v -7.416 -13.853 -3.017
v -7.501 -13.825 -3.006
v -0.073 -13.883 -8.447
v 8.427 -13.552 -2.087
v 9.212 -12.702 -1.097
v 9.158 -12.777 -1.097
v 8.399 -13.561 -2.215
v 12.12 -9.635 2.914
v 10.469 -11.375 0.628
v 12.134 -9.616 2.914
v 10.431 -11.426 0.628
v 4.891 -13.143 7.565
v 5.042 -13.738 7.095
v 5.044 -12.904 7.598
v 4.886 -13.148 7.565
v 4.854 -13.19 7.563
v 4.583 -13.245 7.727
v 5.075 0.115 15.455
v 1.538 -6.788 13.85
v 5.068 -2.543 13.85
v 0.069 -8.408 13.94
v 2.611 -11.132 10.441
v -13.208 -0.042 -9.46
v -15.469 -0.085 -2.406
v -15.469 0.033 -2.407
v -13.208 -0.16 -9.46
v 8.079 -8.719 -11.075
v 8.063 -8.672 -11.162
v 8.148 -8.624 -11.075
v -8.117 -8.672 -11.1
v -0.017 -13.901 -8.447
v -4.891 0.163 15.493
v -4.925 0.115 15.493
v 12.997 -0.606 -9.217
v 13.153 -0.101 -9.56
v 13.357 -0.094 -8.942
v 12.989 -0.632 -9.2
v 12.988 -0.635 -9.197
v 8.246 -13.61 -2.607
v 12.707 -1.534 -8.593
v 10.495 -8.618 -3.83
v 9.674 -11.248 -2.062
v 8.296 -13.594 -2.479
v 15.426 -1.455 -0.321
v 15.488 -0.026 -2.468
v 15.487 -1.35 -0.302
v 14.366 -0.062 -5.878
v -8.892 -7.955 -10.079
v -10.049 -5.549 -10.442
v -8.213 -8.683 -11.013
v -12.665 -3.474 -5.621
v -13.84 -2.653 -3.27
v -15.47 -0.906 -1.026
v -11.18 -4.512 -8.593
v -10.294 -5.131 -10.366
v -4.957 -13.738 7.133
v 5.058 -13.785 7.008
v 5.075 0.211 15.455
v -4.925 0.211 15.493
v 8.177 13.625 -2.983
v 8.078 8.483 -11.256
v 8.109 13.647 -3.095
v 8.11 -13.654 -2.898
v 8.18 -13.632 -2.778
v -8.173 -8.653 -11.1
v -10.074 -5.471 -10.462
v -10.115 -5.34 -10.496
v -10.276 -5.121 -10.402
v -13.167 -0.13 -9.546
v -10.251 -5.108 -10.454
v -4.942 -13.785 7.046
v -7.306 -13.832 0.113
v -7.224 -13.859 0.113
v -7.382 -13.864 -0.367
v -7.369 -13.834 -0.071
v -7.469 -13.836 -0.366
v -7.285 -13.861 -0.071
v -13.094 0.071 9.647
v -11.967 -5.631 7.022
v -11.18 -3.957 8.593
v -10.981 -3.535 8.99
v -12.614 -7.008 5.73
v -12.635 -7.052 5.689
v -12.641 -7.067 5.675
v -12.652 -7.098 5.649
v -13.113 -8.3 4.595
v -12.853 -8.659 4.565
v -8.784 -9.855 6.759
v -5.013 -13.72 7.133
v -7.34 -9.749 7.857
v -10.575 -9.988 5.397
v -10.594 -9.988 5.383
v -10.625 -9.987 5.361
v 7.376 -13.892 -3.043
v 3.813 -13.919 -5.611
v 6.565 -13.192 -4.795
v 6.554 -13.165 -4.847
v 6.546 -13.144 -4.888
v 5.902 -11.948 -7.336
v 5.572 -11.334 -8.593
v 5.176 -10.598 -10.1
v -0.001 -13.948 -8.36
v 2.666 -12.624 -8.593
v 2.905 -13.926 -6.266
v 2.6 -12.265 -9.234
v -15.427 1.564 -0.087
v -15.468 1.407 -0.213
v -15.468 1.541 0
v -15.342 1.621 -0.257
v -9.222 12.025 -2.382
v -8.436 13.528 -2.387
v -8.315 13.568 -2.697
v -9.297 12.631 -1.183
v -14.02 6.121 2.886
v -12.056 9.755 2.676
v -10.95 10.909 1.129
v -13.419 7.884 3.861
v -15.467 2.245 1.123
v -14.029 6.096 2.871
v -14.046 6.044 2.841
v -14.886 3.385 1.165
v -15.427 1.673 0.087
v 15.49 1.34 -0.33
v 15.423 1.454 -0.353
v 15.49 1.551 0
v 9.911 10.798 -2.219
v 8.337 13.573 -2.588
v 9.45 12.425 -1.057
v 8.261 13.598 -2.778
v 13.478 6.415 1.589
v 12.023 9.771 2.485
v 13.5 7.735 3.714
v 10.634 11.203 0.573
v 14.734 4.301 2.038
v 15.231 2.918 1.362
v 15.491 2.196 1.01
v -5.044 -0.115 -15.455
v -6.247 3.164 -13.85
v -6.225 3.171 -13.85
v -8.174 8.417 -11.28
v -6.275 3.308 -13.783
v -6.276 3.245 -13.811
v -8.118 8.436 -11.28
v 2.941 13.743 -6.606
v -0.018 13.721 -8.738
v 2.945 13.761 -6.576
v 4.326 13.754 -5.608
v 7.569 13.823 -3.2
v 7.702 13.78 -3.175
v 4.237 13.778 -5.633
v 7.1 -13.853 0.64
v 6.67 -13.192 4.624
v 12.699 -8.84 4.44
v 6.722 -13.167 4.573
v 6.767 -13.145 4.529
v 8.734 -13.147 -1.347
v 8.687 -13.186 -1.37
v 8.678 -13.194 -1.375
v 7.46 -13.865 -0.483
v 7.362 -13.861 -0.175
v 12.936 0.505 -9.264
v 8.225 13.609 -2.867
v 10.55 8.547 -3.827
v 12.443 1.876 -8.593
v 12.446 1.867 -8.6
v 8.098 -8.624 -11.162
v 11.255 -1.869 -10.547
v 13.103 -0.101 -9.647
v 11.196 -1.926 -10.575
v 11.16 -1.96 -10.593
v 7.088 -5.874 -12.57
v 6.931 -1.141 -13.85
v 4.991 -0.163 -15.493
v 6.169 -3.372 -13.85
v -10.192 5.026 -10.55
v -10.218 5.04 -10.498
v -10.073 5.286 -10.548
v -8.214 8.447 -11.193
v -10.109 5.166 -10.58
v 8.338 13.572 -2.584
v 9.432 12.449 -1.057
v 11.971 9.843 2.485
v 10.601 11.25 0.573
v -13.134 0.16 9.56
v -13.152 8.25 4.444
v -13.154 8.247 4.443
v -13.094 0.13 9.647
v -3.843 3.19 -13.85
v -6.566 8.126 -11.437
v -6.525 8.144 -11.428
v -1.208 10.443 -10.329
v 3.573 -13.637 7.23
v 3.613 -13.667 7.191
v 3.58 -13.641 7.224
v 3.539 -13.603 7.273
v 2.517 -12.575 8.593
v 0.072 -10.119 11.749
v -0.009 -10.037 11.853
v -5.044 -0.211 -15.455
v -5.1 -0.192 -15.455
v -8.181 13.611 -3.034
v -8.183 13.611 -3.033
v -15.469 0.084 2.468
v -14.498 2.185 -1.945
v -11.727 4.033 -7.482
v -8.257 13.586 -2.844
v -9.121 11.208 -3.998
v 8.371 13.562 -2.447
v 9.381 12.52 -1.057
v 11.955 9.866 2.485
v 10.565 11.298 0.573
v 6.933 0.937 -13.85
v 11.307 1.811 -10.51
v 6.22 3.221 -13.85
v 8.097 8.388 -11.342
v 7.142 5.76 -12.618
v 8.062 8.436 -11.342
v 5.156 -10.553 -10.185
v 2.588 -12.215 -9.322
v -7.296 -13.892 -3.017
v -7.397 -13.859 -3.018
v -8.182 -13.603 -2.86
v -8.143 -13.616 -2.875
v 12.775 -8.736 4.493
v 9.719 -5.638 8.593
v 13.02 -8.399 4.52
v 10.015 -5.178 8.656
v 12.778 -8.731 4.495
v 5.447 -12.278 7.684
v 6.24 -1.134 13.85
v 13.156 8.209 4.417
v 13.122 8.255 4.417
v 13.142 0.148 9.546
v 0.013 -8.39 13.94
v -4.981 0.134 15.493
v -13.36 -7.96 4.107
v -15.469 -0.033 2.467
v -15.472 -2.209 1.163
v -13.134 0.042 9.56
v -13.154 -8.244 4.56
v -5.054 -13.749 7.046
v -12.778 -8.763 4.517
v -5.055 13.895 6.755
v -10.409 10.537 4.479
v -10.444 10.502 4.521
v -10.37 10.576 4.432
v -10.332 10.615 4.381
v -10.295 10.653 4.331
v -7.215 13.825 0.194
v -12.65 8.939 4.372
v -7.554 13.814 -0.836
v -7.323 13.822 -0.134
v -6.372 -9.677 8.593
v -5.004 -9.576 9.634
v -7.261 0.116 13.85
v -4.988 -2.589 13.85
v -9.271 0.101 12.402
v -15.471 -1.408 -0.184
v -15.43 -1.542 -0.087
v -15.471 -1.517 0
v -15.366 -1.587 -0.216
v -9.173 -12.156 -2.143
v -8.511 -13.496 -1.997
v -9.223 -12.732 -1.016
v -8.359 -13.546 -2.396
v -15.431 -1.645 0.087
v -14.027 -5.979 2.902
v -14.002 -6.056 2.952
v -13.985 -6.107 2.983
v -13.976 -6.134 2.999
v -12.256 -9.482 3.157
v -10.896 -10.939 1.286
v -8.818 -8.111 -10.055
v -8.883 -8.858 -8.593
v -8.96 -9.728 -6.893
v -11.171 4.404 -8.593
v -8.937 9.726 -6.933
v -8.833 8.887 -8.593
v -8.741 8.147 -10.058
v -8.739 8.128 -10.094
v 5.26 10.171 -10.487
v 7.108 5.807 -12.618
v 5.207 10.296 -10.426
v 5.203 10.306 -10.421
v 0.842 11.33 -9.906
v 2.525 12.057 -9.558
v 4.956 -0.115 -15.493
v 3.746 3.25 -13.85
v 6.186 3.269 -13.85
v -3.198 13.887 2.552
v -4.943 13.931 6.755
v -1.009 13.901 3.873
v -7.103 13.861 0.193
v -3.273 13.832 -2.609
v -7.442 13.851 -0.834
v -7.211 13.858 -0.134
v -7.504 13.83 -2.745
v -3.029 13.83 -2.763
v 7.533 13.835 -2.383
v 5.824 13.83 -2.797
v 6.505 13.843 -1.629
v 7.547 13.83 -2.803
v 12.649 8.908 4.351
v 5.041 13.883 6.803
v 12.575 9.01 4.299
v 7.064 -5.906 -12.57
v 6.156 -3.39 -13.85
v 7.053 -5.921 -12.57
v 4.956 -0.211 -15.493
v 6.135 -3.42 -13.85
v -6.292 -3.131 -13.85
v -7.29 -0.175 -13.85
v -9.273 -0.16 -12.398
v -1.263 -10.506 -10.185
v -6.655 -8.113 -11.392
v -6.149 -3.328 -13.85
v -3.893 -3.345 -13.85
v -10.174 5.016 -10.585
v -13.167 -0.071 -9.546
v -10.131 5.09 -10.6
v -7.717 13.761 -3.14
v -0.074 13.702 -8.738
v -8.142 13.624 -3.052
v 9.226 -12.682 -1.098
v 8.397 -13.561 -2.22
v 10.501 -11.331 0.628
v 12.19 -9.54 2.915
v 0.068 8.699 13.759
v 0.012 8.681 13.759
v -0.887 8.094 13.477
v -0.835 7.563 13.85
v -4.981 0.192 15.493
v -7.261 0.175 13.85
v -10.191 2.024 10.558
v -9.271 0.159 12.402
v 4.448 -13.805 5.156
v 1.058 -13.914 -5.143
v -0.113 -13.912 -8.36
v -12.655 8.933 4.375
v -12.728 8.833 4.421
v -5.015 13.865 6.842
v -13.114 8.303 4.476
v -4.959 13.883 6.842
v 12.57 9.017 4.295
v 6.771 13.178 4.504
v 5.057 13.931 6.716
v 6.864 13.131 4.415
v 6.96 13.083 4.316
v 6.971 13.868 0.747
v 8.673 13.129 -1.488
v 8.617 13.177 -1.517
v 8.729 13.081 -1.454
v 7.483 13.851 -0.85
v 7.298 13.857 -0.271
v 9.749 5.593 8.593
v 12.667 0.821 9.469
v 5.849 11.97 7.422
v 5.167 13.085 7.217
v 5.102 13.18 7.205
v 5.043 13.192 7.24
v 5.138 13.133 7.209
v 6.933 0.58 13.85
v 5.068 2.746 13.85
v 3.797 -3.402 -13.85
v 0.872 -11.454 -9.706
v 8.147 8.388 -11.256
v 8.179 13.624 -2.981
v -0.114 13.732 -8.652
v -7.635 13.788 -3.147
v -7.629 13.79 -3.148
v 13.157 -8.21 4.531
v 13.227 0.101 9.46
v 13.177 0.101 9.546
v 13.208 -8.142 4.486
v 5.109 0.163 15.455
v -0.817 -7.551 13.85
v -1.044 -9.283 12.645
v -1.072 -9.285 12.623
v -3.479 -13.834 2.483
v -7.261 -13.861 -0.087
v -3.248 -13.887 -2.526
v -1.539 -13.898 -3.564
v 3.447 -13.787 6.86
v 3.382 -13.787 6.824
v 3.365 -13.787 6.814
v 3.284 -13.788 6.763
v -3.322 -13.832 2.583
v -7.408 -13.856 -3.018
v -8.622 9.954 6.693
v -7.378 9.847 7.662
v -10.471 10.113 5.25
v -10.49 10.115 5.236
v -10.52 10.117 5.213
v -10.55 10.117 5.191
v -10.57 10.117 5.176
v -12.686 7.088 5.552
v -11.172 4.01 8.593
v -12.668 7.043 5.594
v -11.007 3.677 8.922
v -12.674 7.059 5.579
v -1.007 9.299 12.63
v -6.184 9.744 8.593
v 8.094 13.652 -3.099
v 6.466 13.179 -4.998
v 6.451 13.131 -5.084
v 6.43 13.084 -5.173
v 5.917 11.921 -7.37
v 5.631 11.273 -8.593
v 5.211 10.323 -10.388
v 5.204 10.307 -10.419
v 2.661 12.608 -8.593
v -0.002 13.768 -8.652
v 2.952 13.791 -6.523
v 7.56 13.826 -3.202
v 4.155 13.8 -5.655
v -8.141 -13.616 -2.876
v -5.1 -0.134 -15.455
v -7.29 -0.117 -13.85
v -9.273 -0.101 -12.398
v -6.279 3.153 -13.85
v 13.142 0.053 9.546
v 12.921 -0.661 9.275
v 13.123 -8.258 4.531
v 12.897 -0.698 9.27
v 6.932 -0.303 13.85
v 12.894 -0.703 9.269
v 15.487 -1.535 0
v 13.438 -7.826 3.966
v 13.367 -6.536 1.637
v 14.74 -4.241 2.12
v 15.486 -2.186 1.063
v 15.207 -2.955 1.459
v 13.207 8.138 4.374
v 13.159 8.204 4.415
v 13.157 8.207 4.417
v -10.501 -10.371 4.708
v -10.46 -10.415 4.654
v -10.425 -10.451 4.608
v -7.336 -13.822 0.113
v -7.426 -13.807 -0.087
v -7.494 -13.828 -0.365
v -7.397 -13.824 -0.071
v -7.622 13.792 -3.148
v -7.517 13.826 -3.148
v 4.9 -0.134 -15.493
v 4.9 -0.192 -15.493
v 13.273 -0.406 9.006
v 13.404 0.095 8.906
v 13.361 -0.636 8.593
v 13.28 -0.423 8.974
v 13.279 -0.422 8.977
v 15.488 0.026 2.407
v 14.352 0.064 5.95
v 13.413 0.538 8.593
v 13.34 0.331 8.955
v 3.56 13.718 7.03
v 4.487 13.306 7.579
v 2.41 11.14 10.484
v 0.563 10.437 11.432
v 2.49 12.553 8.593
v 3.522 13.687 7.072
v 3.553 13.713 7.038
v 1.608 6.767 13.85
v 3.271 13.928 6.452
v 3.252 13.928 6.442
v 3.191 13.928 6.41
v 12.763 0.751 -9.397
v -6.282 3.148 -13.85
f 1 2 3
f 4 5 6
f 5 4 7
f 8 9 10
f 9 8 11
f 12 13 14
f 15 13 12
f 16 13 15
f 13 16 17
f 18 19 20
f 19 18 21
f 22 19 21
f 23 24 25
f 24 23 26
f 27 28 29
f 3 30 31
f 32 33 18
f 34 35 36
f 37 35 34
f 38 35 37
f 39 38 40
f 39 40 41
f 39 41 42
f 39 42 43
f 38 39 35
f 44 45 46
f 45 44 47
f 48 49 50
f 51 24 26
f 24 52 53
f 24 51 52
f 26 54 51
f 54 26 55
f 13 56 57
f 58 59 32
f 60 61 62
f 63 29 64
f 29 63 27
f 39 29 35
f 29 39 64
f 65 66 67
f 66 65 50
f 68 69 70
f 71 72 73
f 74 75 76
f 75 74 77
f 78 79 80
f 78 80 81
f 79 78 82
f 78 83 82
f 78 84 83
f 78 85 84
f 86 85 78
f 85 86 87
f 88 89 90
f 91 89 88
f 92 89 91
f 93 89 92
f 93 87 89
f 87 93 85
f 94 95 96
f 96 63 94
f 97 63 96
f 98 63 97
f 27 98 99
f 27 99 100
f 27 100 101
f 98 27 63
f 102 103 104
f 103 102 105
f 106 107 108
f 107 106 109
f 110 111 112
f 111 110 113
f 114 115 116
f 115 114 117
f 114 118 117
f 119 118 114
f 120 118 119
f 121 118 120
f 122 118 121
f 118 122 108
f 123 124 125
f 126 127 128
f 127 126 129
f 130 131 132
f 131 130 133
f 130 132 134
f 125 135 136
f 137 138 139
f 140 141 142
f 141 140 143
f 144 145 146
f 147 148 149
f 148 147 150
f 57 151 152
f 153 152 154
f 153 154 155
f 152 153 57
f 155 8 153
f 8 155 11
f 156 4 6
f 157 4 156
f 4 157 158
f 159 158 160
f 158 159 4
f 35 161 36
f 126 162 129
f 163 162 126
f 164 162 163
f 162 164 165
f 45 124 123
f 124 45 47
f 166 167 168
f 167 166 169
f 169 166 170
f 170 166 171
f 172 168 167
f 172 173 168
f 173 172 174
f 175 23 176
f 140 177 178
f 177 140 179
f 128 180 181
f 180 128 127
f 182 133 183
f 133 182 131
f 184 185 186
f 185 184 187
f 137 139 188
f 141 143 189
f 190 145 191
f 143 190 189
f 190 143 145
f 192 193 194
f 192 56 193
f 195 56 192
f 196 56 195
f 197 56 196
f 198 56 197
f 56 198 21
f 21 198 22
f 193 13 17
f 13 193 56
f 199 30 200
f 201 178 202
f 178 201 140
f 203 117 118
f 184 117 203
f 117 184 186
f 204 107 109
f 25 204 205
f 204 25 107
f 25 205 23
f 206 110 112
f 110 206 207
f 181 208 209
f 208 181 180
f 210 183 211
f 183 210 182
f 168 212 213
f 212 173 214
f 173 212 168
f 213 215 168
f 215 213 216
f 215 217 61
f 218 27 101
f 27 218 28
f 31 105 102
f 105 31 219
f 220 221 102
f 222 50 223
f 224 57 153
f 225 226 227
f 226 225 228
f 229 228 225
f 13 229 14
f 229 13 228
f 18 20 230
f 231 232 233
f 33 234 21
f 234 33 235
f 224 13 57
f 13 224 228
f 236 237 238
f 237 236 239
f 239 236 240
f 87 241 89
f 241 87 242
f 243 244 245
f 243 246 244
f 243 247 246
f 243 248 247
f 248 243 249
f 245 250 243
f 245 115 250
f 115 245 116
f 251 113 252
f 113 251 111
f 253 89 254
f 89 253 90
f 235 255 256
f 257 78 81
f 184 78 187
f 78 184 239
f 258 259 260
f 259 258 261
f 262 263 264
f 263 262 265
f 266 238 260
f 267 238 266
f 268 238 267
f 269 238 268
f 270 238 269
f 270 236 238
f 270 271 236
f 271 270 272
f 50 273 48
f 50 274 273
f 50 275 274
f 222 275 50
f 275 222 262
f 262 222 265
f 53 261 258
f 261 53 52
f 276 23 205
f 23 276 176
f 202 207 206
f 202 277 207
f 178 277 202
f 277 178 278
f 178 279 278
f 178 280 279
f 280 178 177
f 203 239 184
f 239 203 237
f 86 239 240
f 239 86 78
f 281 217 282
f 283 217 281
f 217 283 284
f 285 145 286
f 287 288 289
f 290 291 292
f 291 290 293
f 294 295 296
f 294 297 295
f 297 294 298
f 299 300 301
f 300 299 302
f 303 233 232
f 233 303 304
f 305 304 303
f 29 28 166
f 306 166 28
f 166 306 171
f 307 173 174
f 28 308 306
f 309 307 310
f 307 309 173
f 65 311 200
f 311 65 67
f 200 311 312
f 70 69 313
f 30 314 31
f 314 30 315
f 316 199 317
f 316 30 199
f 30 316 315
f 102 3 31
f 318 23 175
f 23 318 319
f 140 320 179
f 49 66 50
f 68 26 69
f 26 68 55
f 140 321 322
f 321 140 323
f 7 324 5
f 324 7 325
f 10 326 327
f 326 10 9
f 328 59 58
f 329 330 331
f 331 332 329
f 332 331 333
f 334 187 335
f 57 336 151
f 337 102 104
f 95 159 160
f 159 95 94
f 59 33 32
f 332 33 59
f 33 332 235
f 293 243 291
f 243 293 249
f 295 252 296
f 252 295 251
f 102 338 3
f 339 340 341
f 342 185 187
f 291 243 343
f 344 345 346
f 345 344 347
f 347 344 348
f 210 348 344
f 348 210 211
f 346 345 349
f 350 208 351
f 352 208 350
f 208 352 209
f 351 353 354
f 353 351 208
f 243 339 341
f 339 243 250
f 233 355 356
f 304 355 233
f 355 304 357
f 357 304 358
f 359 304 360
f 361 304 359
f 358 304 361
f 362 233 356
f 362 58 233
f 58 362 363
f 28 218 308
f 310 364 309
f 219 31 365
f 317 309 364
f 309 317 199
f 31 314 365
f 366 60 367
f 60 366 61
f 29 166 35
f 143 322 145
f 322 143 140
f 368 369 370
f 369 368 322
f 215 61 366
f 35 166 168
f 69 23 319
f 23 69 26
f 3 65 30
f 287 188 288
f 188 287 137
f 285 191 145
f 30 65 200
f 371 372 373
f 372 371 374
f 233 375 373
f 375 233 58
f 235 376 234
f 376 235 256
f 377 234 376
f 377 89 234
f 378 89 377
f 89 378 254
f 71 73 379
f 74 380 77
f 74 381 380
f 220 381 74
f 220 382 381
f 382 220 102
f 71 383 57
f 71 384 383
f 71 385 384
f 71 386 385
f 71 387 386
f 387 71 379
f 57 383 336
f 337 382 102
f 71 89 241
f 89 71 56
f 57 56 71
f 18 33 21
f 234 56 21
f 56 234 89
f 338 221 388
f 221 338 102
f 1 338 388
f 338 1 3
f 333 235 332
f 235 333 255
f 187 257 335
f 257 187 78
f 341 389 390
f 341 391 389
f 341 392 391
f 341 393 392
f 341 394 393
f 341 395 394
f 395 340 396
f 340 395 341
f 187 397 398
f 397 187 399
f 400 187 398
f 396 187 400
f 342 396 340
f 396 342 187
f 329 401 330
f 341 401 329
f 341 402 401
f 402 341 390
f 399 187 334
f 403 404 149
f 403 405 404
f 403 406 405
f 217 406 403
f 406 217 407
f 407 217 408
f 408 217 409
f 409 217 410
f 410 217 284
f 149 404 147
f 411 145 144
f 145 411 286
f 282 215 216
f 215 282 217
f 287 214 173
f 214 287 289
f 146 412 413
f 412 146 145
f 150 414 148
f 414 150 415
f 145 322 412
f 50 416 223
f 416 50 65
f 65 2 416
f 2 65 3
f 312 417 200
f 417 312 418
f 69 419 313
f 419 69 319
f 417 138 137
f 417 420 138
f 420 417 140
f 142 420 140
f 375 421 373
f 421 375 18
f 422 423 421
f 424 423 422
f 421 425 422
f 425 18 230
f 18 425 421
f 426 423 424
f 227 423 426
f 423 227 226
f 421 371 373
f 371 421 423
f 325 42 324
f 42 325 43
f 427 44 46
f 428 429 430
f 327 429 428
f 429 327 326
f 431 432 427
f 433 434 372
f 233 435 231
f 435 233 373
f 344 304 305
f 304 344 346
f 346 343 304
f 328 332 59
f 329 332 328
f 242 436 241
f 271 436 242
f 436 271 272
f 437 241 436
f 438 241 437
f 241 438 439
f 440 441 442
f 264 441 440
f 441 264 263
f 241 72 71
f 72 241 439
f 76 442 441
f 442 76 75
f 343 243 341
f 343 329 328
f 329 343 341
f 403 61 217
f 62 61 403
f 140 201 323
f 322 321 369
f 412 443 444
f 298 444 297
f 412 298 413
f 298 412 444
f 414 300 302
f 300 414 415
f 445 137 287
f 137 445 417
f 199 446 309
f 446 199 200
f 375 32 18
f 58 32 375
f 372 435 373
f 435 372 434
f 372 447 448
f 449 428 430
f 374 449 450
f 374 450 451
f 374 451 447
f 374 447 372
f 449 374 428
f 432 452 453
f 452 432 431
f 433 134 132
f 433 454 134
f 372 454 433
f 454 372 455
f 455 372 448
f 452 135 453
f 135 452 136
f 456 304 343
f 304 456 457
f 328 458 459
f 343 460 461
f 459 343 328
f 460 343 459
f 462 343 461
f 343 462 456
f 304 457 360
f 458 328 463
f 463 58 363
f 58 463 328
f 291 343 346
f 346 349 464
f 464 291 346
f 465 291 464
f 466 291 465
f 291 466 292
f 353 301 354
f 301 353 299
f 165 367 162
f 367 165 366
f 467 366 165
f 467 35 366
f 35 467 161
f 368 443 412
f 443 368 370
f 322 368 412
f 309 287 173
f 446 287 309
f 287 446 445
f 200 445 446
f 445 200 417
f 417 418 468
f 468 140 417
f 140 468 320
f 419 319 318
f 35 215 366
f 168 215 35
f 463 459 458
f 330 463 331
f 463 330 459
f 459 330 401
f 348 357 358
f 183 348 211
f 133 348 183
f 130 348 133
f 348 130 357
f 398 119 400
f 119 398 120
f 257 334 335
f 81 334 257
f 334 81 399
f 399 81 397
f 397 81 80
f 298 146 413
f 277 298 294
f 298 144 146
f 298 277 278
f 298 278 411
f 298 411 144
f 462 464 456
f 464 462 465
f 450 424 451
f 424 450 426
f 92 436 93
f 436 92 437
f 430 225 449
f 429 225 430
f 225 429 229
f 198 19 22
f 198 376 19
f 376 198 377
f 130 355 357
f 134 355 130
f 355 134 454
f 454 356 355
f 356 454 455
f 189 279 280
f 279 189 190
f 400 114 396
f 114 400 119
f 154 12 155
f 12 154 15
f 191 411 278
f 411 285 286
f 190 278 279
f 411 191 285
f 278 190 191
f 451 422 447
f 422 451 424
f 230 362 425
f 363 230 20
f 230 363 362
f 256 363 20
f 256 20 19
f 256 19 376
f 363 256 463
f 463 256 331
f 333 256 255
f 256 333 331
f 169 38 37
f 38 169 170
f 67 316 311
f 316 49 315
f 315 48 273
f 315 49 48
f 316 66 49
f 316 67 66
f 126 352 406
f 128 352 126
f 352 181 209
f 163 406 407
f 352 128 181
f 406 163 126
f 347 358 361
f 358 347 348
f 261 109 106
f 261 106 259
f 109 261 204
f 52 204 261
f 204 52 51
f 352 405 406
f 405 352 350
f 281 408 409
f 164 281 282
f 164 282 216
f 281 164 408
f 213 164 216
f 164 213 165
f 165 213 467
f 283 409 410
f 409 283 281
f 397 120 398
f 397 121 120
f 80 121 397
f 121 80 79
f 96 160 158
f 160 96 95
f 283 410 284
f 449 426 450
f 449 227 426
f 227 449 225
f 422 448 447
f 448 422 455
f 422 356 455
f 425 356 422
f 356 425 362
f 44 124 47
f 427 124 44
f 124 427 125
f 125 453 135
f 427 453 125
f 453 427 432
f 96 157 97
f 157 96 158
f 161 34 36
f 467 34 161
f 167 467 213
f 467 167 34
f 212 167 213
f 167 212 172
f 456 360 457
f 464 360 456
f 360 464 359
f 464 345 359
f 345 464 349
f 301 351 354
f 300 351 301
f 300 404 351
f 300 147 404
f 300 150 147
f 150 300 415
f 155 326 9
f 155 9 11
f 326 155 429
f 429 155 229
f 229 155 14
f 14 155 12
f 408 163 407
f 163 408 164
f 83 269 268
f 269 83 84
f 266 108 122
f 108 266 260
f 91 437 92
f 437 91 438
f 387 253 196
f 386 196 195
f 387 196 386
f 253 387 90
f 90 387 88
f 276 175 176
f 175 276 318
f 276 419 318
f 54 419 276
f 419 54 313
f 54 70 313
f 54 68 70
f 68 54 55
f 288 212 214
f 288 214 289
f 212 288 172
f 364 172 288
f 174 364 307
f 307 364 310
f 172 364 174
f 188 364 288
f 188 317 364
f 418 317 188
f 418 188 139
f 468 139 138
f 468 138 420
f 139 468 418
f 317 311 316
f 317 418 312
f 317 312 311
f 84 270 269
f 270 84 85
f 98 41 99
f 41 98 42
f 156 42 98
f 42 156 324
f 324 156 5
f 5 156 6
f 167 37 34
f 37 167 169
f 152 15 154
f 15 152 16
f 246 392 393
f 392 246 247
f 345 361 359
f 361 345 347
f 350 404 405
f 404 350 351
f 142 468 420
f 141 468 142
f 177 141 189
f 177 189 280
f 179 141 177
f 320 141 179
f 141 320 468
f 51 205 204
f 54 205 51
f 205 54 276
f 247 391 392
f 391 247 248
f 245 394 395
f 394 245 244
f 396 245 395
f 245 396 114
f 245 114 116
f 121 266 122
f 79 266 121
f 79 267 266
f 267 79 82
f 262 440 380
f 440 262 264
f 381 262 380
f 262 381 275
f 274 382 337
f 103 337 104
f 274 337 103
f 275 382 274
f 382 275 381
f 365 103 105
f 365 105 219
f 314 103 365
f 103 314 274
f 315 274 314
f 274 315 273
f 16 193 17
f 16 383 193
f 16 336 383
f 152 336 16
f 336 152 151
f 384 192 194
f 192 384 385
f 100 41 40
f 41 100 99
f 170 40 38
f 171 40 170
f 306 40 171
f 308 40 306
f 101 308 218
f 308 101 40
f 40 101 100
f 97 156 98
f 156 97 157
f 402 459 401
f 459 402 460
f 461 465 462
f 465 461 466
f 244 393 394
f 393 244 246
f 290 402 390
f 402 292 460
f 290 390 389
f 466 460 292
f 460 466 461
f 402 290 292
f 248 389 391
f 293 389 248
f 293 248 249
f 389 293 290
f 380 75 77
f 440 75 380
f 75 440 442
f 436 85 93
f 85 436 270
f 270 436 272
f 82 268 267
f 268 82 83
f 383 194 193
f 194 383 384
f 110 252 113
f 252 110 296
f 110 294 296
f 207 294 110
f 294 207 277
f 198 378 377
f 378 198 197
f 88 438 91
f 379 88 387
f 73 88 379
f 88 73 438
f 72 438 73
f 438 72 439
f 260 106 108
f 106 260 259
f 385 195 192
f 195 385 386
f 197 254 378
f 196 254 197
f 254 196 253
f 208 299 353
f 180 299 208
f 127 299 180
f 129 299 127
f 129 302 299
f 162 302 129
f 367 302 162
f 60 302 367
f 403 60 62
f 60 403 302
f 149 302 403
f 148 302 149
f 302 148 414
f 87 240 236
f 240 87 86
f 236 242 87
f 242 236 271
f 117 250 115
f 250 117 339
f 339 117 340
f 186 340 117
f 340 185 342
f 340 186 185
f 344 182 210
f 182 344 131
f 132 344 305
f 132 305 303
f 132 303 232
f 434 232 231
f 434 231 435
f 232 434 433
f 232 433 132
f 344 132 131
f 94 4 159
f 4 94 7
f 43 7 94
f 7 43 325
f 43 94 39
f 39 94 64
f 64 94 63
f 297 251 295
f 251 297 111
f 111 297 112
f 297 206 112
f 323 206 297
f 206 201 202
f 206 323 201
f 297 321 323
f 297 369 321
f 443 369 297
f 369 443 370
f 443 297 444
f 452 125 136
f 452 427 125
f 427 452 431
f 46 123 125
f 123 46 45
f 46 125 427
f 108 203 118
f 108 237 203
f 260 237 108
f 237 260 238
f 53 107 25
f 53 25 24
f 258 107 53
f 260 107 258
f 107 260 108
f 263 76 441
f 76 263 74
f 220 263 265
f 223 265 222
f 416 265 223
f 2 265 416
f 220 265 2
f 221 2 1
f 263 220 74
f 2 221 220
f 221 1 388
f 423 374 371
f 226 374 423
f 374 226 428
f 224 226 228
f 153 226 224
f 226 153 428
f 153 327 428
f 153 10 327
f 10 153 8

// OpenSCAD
// Auto-generated OpenSCAD file

    inner_points = 10*[[-0.0016418331039271756, -1.6180331557585443, -9.663416068995967e-15], [0.0016418331039271756, 1.6180331557585443, 9.663416068995967e-15], [-0.9523842975581269, -1.3080512751855748, 1.785566891566374e-13], [0.949727755792118, -1.3099813657560027, -1.9419242480370474e-13], [-0.949727755792118, 1.3099813657560027, 1.9419242480370474e-13], [0.9523842975581269, 1.3080512751855748, -1.785566891566374e-13], [-1.5393483306968156, -0.49843826651935746, 2.9857420804308504e-13], [1.5383336220347341, -0.5015612186636755, -3.045465276211565e-13], [-1.5383336220347341, 0.5015612186636755, 3.045465276211565e-13], [1.5393483306968156, 0.49843826651935746, -2.9857420804308504e-13], [-0.2636863372841518, -0.8087498459225672, -1.376381920471127], [-0.26368633728361235, -0.808749845922584, 1.3763819204712202], [-0.2620445041802246, 0.8092833098359772, -1.3763819204711172], [-0.26204450417968517, 0.8092833098359603, 1.37638192047123], [0.6876832516118934, -0.5006980559200255, -1.3763819204713112], [0.6876832516124327, -0.5006980559200425, 1.376381920471036], [0.6886979602739751, 0.49930142926300763, -1.3763819204713055], [0.6886979602745145, 0.49930142926299065, 1.3763819204710417], [-0.8506503704228404, 0.0008631627436501369, -1.3763819204710068], [-0.8506503704223011, 0.0008631627436331492, 1.3763819204713403], [0.4239969143281142, -1.3094479018426044, -0.850650808352131], [0.4239969143284476, -1.3094479018426148, 0.8506508083519487], [0.42665345609412314, 1.308584739098973, -0.8506508083521155], [0.42665345609445654, 1.3085847390989627, 0.8506508083519643], [-1.1143367077066197, -0.8078866831789286, -0.8506508083518266], [-1.1143367077062865, -0.8078866831789392, 0.8506508083522532], [-1.1126948746026926, 0.8101464725796157, -0.8506508083518168], [-1.1126948746023593, 0.8101464725796051, 0.8506508083522629], [1.376381211886241, -0.0013966266570295412, -0.8506508083523096], [1.3763812118865746, -0.0013966266570400404, 0.8506508083517702]];

    outer_points = 10*[[1.6180220198478508, 0.0, -0.006223506839090811], [-1.6180220198478508, 0.0, 0.006223506839090811], [1.3053494309833273, -0.010073202420207877, -0.9560310572227243], [1.3126651916762522, 0.010073202420207877, 0.9459612116278578], [-1.3126651916762522, -0.010073202420207877, -0.9459612116278578], [-1.3053494309833273, 0.010073202420207877, 0.9560310572227243], [0.4940777266785081, -0.016298783891454047, -1.5406672380477728], [0.5059148761332206, 0.016298783891454047, 1.5368208992919972], [-0.5059148761332206, -0.016298783891454047, -1.5368208992919972], [-0.4940777266785081, 0.016298783891454047, 1.5406672380477728], [0.8079439244447668, 1.3735205511194541, -0.28053858799672193], [0.8080560688782716, -1.3790888804671222, -0.2513826526847642], [-0.810078095403084, 1.3735205511194541, -0.27431508115763115], [-0.8099659509695791, -1.3790888804671222, -0.2451591458456734], [0.5025870962731682, 1.383593753539662, 0.6716461304702268], [0.5026992407066729, -1.3690156780469143, 0.7008020657821845], [-0.4974055065385606, 1.383593753539662, 0.6754924692260023], [-0.4972933621050558, -1.3690156780469143, 0.70464840453796], [-0.003327779860052472, 1.3672949696482082, -0.8651747688217704], [-0.0032156354265477157, -1.3853144619383682, -0.8360188335098125], [1.3106085106156622, 0.8551079663095562, 0.41125379828717096], [1.3106778196872173, -0.8460982201644762, 0.42927315728375415], [-1.3074061120439173, 0.8551079663095562, 0.4213236438820373], [-1.3073368029723622, -0.8460982201644762, 0.4393430028786205], [0.8046936344824416, 0.8388091824181022, -1.1255671010048263], [0.8047629435539967, -0.8623970040559302, -1.1075477420082434], [-0.8133283853654092, 0.8388091824181022, -1.1193435941657353], [-0.8132590762938541, -0.8623970040559302, -1.1013242351691523], [0.005259079632334848, 0.8651811687297641, 1.3672848555098953], [0.00532838870388989, -0.8360250177442683, 1.3853042145064782]];

    // Convex hull for inner set (I)
    module inner_hull() {
        hull() {
            for (p = inner_points) {
                translate(p) sphere(r=0.1);
            }
        }
    }

    // Convex hull for outer set (O) minus inner hull (O \ I)
    module outer_minus_inner() {
        difference() {
            hull() {
                for (p = outer_points) {
                    translate(p) sphere(r=0.1);
                }
            }
            inner_hull(); // Subtract inner hull
        }
    }

    // Convex hull for outer set (O) minus all translated inner hulls
    module outer_minus_AllTranslationInner() {
        difference() {
            hull() {
                for (p = outer_points) {
                    translate(p) sphere(r=0.1);
                }
            }
            hull() {
                translate([0,0,50]) inner_hull();
                translate([0,0,-50]) inner_hull();
            }; // Subtract translated inner hulls
        }
    }

    // Difference between outer_minus_inner and outer_minus_AllTranslationInner
    module outer_minus_inner_diff() {
        difference() {
            // Outer minus inner
            difference() {
                hull() {
                    for (p = outer_points) {
                        translate(p) sphere(r=0.1);
                    }
                }
                inner_hull();
            }

            // Subtract Outer minus AllTranslationInner
            difference() {
                hull() {
                    for (p = outer_points) {
                        translate(p) sphere(r=0.1);
                    }
                }
                hull() {
                    translate([0,0,50]) inner_hull();
                    translate([0,0,-50]) inner_hull();
                };
            }
        }
    }

    // Rendering all with colors applied
    color([1, 1, 0, 1]) outer_minus_inner_diff(); // Opaque yellow
    
